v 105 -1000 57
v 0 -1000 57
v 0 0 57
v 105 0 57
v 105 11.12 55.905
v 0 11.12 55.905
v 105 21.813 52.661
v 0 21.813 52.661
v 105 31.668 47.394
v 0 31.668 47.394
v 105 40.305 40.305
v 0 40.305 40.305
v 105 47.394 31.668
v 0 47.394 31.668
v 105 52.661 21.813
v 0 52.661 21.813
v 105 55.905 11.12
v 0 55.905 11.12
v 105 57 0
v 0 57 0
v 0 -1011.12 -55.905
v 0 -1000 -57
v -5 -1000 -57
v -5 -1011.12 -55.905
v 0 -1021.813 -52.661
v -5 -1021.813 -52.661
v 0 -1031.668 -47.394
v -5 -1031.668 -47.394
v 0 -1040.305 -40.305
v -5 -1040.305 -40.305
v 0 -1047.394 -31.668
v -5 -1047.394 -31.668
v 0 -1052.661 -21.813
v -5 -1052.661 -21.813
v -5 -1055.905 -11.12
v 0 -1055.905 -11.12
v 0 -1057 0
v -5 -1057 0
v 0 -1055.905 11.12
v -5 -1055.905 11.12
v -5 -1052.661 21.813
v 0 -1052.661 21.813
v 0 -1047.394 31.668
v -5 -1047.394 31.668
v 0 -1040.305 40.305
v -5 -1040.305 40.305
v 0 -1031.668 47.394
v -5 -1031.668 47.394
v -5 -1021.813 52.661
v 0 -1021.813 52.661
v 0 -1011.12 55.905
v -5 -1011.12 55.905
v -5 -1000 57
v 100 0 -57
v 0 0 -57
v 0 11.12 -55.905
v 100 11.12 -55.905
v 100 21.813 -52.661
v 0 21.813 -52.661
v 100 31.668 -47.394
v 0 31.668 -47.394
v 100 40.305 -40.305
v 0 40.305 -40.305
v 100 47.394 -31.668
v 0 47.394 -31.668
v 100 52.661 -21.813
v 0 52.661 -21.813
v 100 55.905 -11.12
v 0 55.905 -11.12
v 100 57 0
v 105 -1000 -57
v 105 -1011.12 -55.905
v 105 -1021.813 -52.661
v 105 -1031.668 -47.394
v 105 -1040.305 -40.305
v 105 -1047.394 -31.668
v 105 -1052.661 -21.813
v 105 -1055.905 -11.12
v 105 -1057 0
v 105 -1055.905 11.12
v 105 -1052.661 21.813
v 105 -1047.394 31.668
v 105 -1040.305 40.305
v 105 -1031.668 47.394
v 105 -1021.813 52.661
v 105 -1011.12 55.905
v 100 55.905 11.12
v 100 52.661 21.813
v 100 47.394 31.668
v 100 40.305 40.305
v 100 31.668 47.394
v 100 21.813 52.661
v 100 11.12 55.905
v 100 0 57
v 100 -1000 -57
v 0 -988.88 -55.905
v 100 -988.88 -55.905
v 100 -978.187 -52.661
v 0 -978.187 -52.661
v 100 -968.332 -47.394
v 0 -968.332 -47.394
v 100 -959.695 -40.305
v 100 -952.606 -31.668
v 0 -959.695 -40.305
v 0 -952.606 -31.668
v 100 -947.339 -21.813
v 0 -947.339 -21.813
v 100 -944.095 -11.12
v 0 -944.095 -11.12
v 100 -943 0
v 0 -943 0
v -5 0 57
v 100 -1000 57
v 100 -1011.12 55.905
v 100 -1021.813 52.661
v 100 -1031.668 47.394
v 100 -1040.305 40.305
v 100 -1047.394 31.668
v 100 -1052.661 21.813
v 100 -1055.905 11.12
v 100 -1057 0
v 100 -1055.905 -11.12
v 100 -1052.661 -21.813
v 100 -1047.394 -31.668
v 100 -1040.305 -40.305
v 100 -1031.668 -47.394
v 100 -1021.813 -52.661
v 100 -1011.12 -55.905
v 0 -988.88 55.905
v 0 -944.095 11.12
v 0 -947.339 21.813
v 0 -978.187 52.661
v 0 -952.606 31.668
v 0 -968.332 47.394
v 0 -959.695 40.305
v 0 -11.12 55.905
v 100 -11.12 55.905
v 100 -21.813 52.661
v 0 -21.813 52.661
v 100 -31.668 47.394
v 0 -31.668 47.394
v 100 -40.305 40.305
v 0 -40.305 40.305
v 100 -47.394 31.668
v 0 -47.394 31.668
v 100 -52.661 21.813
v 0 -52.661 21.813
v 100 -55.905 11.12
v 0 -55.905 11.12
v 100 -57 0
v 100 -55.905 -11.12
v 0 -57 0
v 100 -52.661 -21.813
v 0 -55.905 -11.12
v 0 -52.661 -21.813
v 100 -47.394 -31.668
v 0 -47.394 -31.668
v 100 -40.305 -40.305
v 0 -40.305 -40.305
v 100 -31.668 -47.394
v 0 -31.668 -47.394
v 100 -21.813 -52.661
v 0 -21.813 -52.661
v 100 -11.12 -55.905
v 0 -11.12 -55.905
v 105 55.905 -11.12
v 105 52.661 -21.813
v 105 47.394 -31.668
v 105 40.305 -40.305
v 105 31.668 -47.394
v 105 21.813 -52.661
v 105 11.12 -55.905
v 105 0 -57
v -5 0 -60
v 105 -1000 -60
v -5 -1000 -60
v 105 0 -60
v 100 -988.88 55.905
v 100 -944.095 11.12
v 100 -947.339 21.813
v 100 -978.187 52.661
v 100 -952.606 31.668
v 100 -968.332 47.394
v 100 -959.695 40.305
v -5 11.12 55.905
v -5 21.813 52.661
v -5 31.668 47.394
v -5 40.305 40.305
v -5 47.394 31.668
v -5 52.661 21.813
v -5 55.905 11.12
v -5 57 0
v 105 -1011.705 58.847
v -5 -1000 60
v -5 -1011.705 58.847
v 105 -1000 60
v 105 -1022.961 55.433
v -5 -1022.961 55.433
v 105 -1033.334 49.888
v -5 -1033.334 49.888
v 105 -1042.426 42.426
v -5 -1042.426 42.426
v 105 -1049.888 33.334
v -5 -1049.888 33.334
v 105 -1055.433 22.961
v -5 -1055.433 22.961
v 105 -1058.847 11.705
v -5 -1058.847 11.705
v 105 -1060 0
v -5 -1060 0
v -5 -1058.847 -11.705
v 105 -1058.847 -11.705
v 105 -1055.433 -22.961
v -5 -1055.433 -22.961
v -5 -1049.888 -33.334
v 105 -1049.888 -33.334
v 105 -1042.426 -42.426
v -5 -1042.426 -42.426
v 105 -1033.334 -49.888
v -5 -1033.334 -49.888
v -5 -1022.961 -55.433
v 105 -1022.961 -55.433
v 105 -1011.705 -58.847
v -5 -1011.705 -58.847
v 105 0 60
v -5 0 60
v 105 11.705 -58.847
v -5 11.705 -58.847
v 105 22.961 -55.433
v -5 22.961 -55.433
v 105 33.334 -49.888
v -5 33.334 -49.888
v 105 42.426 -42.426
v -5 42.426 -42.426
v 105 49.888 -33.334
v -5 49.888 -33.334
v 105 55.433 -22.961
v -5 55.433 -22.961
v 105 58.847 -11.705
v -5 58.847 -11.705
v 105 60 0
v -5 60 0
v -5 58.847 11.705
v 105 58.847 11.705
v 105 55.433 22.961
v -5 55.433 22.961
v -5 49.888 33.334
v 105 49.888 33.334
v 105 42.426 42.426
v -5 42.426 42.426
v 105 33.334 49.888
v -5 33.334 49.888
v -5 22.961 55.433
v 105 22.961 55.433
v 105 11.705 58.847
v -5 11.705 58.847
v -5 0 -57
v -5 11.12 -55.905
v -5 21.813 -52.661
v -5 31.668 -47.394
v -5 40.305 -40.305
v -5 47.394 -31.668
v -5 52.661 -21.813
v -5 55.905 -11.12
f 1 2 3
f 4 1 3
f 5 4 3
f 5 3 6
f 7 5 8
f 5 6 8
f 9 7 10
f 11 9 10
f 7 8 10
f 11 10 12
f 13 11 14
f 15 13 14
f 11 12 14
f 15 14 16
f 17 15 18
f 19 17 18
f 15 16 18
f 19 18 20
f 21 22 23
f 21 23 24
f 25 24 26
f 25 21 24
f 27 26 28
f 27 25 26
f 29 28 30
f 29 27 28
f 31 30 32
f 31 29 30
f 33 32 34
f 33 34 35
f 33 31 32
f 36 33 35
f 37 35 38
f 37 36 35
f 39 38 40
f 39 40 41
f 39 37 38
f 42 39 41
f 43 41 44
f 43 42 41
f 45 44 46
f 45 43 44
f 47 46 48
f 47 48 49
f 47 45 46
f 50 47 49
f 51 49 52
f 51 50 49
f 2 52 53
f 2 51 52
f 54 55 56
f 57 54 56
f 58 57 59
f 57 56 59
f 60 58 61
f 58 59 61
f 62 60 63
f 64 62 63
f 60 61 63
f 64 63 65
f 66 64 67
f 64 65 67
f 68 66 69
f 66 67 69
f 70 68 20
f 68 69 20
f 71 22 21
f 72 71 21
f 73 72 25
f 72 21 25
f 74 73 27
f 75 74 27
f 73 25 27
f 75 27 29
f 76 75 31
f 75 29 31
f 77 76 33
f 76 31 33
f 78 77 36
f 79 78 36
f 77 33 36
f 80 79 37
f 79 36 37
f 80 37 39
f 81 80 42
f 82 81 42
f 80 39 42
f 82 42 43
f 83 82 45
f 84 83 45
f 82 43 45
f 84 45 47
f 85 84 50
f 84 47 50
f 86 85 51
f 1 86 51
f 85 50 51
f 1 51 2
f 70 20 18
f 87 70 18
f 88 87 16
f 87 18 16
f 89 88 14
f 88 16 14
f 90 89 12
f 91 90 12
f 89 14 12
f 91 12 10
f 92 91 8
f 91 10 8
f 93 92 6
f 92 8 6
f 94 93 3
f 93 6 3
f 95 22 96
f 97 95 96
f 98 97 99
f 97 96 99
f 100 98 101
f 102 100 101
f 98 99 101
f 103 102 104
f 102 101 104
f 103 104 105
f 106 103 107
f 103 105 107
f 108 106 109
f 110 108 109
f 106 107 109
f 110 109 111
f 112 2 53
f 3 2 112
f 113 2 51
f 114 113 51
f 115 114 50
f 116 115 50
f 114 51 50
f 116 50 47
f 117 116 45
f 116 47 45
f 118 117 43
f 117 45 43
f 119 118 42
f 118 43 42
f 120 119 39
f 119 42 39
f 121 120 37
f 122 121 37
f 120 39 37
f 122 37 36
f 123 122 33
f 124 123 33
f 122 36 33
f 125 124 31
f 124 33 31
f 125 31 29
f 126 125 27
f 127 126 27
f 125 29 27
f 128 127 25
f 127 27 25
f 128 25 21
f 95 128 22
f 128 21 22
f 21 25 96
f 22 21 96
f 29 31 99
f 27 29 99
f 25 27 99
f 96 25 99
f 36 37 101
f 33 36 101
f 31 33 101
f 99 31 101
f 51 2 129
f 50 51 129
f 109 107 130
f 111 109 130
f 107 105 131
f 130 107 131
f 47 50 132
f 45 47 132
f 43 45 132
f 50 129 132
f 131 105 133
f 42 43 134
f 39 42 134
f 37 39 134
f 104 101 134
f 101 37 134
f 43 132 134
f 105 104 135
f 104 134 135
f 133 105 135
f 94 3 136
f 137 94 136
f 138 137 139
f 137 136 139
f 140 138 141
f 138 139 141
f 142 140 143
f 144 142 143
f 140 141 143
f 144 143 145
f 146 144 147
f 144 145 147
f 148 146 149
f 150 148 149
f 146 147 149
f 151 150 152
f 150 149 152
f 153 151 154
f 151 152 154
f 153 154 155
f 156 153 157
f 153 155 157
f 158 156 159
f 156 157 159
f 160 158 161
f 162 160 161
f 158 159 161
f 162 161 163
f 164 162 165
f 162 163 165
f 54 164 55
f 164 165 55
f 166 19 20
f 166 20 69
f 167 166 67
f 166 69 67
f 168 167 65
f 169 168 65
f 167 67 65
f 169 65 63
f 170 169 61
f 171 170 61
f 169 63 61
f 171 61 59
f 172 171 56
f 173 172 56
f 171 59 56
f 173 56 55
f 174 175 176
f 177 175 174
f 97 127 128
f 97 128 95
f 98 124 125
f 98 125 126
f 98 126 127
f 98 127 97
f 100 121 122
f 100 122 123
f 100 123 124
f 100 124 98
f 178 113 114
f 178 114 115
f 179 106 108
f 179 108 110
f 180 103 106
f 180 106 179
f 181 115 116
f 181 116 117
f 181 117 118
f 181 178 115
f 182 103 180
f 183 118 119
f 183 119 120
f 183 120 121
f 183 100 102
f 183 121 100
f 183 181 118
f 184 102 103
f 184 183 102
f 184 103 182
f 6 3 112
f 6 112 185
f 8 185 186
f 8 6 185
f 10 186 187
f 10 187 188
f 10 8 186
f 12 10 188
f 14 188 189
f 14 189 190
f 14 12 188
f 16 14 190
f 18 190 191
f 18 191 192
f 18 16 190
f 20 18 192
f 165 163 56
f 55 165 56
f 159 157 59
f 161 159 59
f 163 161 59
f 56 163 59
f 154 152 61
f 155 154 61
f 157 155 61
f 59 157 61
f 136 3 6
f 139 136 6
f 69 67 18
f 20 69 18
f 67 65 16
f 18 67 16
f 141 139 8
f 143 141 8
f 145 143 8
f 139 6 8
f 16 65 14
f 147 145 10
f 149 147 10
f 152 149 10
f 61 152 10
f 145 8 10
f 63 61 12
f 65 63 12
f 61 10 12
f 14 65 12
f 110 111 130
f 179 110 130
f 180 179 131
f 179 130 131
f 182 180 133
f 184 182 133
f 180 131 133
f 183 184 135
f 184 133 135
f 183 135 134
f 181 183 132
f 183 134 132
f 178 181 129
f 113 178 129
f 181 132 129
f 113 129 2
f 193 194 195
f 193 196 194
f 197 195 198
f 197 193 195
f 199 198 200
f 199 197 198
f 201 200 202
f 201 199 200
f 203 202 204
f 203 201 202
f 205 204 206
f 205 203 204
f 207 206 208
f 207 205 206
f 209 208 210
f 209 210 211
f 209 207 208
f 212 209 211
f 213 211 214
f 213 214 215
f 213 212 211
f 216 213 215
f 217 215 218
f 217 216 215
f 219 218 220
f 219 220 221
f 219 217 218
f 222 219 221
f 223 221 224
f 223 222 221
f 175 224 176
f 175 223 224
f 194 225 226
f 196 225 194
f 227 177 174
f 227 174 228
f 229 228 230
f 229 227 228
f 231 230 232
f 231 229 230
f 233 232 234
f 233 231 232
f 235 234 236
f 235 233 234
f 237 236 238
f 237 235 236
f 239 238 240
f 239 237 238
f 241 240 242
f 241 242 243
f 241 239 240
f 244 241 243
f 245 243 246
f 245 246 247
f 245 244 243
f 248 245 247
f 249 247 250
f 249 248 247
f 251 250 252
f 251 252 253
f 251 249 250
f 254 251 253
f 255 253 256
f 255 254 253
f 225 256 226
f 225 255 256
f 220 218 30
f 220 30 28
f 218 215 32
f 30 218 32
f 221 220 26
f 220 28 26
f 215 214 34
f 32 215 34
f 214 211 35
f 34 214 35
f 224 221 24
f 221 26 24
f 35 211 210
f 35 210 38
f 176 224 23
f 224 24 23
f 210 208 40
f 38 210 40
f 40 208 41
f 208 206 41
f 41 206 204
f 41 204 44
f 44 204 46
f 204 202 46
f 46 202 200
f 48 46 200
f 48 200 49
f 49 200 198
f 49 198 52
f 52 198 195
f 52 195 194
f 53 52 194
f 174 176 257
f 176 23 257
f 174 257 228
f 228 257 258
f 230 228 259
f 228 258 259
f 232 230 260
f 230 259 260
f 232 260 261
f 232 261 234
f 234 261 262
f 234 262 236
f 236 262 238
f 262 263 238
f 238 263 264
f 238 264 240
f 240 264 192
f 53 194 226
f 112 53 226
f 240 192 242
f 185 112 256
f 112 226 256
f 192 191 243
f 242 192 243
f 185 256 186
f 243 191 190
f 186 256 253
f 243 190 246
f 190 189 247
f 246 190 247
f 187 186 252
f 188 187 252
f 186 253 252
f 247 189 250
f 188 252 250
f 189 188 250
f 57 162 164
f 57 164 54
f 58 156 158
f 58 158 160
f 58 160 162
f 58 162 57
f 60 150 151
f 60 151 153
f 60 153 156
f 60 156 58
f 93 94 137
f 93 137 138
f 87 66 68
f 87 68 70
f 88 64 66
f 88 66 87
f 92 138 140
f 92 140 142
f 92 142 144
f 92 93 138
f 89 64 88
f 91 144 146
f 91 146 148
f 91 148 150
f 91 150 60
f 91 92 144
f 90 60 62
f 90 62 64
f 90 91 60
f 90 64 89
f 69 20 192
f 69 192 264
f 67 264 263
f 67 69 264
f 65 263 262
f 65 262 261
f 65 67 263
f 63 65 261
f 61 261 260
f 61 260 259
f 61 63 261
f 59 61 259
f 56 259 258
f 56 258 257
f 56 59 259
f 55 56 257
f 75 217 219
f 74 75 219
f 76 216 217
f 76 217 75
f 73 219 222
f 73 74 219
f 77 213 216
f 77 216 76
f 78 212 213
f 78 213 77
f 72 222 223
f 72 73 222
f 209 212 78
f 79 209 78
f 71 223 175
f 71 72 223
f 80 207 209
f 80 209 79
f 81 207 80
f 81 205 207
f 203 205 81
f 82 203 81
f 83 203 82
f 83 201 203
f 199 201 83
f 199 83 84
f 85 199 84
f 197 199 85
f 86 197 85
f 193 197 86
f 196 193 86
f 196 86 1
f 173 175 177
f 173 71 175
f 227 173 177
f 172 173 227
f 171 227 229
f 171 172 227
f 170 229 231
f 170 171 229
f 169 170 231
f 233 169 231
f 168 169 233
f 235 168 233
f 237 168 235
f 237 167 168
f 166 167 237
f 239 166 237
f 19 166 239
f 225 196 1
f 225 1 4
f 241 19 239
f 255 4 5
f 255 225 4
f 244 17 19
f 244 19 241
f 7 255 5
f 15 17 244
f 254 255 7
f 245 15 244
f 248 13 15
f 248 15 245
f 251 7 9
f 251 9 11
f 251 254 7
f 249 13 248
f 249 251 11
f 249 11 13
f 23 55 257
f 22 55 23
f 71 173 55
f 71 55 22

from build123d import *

# Parameters (mm, degrees)
F1_DEPTH = 100
F2_DEPTH = 105
F3_DEPTH = 5


with BuildPart() as f1:
    # F0 (on Right) → F1 (new body)
    with BuildSketch(Plane.YZ):
        with BuildLine():
            ThreePointArc((-943, 0), (-959.6949134724, 40.3050865276), (-1000, 57))
            ThreePointArc((-1000, 57), (-1057, 0), (-1000, -57))
            ThreePointArc((-1000, -57), (-959.6949134724, -40.3050865276), (-943, 0))
        make_face()
    extrude(amount=F1_DEPTH)


with BuildPart() as f1b:
    # F0 (on Right) → F1, piece 2 (new body)
    with BuildSketch(Plane.YZ):
        with BuildLine():
            ThreePointArc((57, 0), (40.3050865276, 40.3050865276), (0, 57))
            ThreePointArc((0, 57), (-57, 0), (0, -57))
            ThreePointArc((0, -57), (40.3050865276, -40.3050865276), (57, 0))
        make_face()
    extrude(amount=F1_DEPTH)


with BuildPart() as f2:
    # F0 (on Right) → F2 (new body)
    with BuildSketch(Plane.YZ):
        with BuildLine():
            Line((-1000, -60), (0, -60))
            ThreePointArc((0, -60), (60, 0), (0, 60))
            Line((0, 60), (-1000, 60))
            ThreePointArc((-1000, 60), (-1060, 0), (-1000, -60))
        make_face()
        with BuildLine():
            ThreePointArc((-1000, -57), (-1057, 0), (-1000, 57))
            Line((-1000, 57), (0, 57))
            ThreePointArc((0, 57), (40.3050865276, 40.3050865276), (57, 0))
            ThreePointArc((57, 0), (40.3050865276, -40.3050865276), (0, -57))
            Line((0, -57), (-1000, -57))
        make_face(mode=Mode.SUBTRACT)
    extrude(amount=F2_DEPTH)

    # F0 (on Right) → F3 (join)
    with BuildSketch(Plane.YZ):
        with BuildLine():
            Line((-1000, -60), (0, -60))
            ThreePointArc((0, -60), (60, 0), (0, 60))
            Line((0, 60), (-1000, 60))
            ThreePointArc((-1000, 60), (-1060, 0), (-1000, -60))
        make_face()
        with BuildLine():
            ThreePointArc((-1000, -57), (-1057, 0), (-1000, 57))
            Line((-1000, 57), (0, 57))
            ThreePointArc((0, 57), (40.3050865276, 40.3050865276), (57, 0))
            ThreePointArc((57, 0), (40.3050865276, -40.3050865276), (0, -57))
            Line((0, -57), (-1000, -57))
        make_face(mode=Mode.SUBTRACT)
    extrude(amount=-F3_DEPTH)


solid = Compound([f1.part, f1b.part, f2.part])
